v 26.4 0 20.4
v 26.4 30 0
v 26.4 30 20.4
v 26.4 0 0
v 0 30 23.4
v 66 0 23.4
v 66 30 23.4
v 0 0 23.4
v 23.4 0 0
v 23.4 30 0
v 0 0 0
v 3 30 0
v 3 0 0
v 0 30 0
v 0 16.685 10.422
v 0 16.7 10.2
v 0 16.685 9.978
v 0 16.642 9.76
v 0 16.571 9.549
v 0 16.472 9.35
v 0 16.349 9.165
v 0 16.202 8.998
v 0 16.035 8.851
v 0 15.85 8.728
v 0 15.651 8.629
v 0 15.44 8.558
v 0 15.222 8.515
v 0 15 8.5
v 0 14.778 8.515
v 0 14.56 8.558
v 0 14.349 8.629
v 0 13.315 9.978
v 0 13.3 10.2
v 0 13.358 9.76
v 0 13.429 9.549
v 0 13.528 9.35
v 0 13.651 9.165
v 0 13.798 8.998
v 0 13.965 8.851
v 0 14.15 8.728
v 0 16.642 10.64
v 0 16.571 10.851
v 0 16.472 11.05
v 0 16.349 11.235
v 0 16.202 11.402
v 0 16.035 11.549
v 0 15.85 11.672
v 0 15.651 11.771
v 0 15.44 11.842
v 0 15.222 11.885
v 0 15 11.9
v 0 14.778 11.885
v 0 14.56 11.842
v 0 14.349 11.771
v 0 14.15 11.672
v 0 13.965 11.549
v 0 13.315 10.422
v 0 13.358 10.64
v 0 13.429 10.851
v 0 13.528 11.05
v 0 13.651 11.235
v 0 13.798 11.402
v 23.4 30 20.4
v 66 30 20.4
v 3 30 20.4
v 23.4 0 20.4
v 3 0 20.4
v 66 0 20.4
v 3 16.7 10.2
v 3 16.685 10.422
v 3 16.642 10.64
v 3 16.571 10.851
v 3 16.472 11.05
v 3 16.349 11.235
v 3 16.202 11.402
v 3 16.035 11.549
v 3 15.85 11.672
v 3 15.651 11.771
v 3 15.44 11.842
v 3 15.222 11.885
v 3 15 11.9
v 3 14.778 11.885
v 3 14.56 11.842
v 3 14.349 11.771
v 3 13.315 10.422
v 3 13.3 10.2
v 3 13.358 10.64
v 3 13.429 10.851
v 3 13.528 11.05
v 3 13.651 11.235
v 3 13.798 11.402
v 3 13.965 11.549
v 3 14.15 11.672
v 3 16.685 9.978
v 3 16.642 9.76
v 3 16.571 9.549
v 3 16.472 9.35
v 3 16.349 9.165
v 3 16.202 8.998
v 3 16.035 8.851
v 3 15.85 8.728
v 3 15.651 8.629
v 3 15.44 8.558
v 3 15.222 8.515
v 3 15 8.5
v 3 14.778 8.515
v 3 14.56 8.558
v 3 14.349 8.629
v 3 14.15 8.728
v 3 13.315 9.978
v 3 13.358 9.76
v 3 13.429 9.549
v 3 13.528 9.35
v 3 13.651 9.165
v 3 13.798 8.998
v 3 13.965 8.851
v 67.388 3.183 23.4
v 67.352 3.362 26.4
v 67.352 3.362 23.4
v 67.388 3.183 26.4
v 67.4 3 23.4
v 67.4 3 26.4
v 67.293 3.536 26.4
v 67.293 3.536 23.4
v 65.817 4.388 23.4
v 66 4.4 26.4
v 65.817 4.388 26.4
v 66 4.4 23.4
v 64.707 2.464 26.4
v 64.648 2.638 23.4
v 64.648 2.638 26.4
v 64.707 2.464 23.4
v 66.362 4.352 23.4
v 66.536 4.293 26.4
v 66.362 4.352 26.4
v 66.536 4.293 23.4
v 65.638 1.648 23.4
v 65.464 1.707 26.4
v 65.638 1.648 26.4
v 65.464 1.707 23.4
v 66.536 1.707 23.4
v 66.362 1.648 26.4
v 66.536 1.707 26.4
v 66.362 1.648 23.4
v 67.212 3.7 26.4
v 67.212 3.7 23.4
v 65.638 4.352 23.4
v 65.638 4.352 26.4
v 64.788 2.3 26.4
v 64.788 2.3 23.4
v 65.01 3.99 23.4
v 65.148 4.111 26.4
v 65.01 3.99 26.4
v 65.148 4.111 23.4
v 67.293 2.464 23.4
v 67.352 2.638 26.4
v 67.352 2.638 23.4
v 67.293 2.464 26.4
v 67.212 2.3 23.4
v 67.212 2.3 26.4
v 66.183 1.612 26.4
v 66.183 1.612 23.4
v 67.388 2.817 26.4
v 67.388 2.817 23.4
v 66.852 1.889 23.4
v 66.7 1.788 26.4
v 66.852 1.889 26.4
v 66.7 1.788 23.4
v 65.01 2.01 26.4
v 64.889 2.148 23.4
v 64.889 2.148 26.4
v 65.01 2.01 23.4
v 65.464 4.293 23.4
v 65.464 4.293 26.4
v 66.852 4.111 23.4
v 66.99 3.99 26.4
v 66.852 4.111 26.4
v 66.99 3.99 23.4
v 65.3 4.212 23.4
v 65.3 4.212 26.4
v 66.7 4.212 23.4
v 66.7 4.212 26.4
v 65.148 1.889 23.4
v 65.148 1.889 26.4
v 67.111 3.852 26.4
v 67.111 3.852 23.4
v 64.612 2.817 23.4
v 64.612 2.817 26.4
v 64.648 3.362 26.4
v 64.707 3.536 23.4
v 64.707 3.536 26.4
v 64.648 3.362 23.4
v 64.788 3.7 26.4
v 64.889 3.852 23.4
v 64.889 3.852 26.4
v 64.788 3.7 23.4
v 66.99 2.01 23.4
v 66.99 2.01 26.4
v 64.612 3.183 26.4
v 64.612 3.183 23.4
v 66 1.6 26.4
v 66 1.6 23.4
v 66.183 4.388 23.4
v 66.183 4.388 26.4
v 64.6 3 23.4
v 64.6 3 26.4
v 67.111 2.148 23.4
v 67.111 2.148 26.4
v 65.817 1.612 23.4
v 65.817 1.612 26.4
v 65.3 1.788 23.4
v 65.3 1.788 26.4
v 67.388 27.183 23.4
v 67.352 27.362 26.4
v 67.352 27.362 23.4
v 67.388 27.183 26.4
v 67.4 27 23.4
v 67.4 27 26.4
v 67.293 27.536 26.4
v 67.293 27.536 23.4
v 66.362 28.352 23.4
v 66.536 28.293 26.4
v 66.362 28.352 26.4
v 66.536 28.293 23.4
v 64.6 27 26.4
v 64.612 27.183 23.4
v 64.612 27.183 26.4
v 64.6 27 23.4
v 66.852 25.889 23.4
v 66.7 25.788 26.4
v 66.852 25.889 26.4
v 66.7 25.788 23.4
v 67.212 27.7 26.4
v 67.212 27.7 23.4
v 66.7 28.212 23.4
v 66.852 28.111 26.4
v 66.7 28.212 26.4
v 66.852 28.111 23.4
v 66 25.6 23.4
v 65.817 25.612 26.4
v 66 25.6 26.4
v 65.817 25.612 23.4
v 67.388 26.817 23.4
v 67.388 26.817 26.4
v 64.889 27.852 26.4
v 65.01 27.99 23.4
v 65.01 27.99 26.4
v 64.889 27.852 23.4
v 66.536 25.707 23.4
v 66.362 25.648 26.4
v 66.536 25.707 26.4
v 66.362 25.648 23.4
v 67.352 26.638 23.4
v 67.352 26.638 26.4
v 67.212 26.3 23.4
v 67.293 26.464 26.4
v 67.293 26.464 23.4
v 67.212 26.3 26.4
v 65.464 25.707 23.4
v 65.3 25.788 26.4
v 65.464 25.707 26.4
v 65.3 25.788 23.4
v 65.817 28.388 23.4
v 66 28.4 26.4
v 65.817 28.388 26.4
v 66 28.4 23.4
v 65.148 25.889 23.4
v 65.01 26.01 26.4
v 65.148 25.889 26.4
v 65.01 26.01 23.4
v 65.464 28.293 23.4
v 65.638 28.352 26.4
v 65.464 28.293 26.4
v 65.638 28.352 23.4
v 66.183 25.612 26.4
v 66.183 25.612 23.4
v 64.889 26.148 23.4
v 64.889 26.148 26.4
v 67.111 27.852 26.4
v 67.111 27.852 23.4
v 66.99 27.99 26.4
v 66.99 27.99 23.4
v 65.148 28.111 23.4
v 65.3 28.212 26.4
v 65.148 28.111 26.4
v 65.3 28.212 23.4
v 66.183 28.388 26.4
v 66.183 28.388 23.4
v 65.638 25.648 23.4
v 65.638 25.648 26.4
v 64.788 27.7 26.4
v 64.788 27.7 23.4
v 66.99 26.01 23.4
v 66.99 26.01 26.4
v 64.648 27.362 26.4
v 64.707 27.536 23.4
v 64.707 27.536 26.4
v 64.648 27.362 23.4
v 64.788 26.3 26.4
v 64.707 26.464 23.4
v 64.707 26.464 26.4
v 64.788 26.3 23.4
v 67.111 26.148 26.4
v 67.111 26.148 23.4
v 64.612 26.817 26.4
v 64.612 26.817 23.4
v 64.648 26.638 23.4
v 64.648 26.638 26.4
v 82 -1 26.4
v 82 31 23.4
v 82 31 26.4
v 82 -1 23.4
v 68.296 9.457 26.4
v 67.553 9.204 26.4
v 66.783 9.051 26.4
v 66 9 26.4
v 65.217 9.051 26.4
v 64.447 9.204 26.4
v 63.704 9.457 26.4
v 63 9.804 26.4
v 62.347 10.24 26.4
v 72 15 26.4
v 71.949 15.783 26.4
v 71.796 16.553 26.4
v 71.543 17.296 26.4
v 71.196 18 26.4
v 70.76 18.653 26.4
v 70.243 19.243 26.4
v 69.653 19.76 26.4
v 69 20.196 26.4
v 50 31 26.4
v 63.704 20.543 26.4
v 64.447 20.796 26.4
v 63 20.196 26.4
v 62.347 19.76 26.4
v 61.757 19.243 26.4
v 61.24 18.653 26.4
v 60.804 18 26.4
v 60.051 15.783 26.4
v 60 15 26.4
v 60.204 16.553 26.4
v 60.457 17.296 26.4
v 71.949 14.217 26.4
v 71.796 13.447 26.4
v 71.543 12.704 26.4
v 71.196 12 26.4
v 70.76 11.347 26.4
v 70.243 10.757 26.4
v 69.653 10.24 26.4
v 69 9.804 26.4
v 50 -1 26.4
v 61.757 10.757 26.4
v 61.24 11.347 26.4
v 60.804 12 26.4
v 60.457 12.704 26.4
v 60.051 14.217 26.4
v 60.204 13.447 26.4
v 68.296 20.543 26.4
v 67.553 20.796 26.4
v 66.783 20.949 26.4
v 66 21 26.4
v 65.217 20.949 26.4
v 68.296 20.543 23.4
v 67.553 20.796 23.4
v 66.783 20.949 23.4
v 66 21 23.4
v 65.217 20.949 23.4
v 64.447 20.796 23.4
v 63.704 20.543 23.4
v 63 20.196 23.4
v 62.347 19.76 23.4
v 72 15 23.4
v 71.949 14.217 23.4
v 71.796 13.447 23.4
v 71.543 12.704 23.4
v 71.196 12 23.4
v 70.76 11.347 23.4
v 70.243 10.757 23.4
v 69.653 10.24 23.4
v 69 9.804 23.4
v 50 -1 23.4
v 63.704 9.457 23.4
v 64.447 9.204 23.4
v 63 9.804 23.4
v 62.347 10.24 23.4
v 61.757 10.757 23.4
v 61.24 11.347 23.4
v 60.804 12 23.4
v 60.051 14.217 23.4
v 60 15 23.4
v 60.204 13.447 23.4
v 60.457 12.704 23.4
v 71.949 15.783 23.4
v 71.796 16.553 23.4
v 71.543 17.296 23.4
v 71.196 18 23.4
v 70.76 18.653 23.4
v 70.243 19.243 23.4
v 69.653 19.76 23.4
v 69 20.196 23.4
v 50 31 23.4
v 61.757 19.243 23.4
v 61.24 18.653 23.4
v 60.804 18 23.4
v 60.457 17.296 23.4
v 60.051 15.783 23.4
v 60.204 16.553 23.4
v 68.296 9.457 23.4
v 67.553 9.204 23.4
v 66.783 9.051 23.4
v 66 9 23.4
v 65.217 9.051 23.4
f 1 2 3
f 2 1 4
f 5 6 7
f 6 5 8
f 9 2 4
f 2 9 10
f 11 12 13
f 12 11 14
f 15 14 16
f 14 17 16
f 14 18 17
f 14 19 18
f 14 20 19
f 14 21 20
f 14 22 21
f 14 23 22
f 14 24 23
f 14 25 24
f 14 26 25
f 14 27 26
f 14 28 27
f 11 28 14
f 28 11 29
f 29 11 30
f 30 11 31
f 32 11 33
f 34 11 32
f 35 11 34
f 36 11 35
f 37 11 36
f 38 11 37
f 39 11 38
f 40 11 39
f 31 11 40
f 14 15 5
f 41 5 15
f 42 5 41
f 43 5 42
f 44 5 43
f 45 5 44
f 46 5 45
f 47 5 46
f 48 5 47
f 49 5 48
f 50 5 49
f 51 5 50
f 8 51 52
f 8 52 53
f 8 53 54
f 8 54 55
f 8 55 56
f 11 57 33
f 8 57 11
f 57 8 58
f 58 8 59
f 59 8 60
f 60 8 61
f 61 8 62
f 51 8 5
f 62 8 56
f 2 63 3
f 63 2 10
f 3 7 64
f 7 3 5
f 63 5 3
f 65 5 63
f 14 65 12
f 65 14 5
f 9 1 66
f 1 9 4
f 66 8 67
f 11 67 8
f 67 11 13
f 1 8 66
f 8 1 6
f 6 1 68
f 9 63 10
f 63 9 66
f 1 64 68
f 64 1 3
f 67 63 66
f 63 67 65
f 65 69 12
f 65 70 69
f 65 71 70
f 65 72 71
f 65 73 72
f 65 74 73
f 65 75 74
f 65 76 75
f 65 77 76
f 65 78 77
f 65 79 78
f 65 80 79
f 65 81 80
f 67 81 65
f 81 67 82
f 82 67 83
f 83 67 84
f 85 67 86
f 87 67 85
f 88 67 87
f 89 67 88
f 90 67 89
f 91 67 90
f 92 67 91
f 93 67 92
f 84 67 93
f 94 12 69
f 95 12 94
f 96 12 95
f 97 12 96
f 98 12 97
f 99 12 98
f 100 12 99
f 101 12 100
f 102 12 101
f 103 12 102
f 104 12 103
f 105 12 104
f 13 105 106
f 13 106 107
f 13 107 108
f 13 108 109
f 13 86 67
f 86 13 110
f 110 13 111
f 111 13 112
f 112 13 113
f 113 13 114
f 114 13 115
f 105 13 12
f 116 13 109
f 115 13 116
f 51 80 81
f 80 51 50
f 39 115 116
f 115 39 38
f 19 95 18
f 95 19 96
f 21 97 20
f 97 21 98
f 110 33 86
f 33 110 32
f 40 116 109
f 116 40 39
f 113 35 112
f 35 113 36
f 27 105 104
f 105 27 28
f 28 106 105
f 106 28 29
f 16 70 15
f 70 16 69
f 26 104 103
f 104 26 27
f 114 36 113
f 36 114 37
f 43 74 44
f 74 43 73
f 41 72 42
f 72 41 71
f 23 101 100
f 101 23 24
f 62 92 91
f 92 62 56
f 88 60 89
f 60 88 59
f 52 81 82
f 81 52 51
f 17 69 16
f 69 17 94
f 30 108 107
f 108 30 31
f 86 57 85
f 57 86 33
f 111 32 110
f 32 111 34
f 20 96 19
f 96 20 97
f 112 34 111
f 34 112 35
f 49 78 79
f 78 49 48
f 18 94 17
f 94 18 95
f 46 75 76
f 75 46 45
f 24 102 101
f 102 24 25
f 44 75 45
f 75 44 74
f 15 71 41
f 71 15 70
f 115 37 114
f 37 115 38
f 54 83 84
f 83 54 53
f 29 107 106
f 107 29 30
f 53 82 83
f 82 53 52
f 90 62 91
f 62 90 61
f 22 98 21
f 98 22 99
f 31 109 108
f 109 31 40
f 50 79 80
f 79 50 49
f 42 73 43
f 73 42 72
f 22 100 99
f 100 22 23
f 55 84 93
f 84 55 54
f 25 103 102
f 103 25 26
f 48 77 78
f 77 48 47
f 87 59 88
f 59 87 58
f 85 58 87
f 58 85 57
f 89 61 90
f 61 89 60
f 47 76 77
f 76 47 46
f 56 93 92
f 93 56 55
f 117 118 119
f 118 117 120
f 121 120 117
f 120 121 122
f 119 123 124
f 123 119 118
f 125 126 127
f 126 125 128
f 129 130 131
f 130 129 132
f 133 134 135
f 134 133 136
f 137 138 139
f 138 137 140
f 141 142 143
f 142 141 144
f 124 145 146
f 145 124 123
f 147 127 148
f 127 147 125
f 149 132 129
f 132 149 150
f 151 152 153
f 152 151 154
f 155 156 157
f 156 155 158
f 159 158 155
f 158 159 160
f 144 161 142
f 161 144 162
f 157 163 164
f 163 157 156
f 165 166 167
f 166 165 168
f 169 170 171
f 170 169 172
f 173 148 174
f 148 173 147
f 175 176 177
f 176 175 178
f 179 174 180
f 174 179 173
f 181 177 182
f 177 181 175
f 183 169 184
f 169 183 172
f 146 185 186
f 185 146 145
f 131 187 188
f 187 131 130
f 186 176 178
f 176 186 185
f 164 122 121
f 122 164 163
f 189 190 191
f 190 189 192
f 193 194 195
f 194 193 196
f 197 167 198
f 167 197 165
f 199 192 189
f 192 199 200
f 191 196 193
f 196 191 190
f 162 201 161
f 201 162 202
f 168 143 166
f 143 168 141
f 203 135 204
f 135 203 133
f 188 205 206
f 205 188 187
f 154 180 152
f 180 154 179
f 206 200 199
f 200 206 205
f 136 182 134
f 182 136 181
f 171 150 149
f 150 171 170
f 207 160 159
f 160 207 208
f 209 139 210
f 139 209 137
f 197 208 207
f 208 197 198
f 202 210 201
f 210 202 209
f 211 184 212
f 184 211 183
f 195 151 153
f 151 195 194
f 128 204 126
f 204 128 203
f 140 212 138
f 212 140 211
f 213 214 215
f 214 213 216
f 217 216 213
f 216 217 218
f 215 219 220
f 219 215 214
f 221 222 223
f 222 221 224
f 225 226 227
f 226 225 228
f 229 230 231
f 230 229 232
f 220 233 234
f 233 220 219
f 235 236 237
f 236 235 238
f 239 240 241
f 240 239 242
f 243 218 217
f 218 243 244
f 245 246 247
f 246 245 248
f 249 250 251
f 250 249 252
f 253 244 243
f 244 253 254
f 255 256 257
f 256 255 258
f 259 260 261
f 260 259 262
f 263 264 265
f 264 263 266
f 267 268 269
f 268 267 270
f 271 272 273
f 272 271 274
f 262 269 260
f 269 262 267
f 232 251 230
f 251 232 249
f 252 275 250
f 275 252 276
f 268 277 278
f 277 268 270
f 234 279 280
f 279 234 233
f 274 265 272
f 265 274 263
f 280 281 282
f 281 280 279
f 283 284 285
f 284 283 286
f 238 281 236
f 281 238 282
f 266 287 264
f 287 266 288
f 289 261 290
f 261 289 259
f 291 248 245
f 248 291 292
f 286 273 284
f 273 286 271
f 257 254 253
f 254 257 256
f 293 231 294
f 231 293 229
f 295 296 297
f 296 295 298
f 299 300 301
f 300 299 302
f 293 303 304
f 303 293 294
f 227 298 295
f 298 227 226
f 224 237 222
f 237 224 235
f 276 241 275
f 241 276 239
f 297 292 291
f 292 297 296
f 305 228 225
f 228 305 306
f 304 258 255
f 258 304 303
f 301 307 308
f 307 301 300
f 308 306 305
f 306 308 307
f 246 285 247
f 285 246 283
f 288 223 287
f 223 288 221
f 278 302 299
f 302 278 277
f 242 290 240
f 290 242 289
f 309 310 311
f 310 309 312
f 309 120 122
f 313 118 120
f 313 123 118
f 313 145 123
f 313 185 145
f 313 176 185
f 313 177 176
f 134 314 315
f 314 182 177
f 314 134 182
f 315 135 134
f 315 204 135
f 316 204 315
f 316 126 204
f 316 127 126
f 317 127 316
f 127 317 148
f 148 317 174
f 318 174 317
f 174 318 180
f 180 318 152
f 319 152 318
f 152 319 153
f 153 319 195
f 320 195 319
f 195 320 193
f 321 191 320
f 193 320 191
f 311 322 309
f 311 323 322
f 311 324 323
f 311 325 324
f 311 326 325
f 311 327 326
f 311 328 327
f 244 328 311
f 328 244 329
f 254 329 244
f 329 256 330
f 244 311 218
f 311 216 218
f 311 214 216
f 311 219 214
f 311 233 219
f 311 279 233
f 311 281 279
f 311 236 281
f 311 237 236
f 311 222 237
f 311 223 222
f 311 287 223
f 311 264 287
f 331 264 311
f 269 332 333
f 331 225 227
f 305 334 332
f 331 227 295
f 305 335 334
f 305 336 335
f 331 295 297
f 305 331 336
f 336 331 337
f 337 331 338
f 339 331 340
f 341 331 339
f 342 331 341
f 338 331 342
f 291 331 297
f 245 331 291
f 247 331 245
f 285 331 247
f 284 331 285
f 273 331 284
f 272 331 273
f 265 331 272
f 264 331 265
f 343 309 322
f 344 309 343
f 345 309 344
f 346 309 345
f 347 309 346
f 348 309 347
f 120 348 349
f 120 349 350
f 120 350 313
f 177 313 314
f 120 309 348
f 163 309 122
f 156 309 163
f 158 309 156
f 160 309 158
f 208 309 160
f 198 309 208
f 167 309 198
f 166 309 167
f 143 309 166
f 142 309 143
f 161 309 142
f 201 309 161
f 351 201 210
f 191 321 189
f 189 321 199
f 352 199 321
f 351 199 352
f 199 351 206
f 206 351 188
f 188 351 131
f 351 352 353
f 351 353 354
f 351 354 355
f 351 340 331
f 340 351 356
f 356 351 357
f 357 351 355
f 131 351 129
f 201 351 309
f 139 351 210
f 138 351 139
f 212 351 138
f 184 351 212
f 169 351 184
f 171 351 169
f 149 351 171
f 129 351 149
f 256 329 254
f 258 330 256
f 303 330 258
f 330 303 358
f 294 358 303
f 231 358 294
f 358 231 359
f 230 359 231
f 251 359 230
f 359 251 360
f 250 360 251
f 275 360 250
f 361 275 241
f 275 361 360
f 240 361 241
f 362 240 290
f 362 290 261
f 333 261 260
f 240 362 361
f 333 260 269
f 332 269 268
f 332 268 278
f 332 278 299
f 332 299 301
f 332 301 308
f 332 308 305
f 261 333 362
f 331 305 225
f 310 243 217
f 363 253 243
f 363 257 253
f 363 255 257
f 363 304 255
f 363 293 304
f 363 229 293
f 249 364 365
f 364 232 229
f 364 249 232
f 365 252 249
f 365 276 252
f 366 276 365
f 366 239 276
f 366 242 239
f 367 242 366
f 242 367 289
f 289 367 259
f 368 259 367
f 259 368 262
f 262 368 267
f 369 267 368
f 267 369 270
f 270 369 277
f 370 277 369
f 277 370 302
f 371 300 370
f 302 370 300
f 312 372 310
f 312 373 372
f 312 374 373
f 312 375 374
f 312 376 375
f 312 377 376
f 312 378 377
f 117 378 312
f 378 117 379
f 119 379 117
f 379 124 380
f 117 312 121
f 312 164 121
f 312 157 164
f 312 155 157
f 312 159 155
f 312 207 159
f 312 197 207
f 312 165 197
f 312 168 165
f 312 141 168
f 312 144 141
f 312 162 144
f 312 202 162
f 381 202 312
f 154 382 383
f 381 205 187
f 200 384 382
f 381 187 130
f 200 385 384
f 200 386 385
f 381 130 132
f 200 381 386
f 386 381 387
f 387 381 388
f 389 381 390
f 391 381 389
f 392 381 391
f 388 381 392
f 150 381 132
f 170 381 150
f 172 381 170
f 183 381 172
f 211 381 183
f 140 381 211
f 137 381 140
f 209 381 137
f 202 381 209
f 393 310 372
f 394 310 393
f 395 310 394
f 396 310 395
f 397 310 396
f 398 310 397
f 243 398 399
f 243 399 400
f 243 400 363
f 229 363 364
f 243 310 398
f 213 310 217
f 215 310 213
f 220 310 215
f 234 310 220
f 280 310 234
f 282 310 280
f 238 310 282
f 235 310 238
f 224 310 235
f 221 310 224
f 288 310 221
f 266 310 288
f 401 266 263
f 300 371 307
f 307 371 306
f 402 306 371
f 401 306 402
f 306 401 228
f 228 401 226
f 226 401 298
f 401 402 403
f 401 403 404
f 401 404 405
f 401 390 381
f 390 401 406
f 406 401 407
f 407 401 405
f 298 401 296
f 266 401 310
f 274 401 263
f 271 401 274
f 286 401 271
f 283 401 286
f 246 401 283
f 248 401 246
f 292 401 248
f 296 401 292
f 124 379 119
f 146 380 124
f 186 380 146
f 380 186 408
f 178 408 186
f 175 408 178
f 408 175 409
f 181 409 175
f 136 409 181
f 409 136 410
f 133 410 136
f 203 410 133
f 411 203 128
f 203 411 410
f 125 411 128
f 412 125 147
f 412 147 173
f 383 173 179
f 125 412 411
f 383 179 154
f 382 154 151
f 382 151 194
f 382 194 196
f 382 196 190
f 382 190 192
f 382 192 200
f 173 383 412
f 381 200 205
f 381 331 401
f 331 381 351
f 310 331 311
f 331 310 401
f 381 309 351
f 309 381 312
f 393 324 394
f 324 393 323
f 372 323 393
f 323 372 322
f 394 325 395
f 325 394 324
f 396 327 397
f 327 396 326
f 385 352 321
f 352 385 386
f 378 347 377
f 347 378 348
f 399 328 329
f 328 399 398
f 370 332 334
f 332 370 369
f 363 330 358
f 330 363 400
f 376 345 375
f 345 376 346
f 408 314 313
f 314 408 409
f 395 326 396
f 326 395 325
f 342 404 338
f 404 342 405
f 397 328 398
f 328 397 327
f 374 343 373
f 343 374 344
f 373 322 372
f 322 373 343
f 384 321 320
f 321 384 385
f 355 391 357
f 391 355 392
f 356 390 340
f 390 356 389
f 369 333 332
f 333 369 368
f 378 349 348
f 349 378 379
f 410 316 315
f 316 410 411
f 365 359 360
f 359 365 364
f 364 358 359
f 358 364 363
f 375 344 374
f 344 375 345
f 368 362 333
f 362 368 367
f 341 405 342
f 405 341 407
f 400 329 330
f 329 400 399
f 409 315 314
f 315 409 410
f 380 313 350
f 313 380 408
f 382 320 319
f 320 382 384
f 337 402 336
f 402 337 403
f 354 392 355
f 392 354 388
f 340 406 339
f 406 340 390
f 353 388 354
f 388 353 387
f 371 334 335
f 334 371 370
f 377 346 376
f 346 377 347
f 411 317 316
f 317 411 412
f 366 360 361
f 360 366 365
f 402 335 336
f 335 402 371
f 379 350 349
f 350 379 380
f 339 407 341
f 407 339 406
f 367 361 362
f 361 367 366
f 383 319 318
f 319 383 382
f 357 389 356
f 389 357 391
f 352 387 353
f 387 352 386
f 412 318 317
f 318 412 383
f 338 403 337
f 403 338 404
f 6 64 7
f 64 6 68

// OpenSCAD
// LaserFoundry camera bracket: an original, parametric clip-on mount that holds a generic UVC webcam board
// looking straight down. Licence: CC BY 4.0 (see README.md). Units: millimetres.
// NOT YET COMPILED OR TEST-PRINTED: render in OpenSCAD, check the preview, then export STL/3MF.

// ---- measure these 3 numbers on your frame (TODO defaults are placeholders) ----
frame_thickness = 20;   // TODO measure: depth of the top-frame bar the clip grips (mm)
frame_height    = 20;   // TODO measure: height of the bar, the part the clip hooks over (mm)
clip_gap_slack  = 0.4;  // TODO tune: extra clearance so it slides on (0.2 to 0.6)

// ---- camera board (check against your camera) ----
board_w = 32;           // board width (mm)
board_h = 32;           // board height (mm)
hole_spacing = 24;      // distance between the two mounting holes (mm)
hole_d = 2.8;           // hole diameter for M2.5 / M3 self-tapping screws
tilt = 0;               // 0 = looking straight down; positive tilts toward the machine front (degrees)

// ---- print ----
wall = 3;               // clip wall thickness (mm)
arm_len = 40;           // how far the arm reaches in from the frame (mm)
clamp_screw_d = 3.4;    // M3 clearance hole for a clamp screw (optional)
$fn = 48;

module clip() {
    inner_t = frame_thickness + clip_gap_slack;
    inner_h = frame_height + clip_gap_slack;
    difference() {
        cube([inner_t + 2 * wall, 30, inner_h + wall]);
        translate([wall, -1, -1]) cube([inner_t, 32, inner_h + 1]);
        // optional clamp screw through the outer wall
        translate([-1, 15, inner_h / 2]) rotate([0, 90, 0]) cylinder(d = clamp_screw_d, h = wall + 2);
    }
}

module arm() {
    translate([0, 0, frame_height + clip_gap_slack])
        cube([arm_len + frame_thickness + 2 * wall, 30, wall]);
}

module plate() {
    // camera plate at the end of the arm, tilted about the Y axis
    translate([arm_len + frame_thickness + 2 * wall, 15, frame_height + clip_gap_slack + wall])
    rotate([0, tilt, 0])
    difference() {
        translate([-board_w / 2, -board_h / 2, 0]) cube([board_w, board_h, wall]);
        for (s = [-1, 1]) translate([0, s * hole_spacing / 2, -1]) cylinder(d = hole_d, h = wall + 2);
        translate([0, 0, -1]) cylinder(d = 12, h = wall + 2); // lens clearance
    }
}

union() { clip(); arm(); plate(); }
